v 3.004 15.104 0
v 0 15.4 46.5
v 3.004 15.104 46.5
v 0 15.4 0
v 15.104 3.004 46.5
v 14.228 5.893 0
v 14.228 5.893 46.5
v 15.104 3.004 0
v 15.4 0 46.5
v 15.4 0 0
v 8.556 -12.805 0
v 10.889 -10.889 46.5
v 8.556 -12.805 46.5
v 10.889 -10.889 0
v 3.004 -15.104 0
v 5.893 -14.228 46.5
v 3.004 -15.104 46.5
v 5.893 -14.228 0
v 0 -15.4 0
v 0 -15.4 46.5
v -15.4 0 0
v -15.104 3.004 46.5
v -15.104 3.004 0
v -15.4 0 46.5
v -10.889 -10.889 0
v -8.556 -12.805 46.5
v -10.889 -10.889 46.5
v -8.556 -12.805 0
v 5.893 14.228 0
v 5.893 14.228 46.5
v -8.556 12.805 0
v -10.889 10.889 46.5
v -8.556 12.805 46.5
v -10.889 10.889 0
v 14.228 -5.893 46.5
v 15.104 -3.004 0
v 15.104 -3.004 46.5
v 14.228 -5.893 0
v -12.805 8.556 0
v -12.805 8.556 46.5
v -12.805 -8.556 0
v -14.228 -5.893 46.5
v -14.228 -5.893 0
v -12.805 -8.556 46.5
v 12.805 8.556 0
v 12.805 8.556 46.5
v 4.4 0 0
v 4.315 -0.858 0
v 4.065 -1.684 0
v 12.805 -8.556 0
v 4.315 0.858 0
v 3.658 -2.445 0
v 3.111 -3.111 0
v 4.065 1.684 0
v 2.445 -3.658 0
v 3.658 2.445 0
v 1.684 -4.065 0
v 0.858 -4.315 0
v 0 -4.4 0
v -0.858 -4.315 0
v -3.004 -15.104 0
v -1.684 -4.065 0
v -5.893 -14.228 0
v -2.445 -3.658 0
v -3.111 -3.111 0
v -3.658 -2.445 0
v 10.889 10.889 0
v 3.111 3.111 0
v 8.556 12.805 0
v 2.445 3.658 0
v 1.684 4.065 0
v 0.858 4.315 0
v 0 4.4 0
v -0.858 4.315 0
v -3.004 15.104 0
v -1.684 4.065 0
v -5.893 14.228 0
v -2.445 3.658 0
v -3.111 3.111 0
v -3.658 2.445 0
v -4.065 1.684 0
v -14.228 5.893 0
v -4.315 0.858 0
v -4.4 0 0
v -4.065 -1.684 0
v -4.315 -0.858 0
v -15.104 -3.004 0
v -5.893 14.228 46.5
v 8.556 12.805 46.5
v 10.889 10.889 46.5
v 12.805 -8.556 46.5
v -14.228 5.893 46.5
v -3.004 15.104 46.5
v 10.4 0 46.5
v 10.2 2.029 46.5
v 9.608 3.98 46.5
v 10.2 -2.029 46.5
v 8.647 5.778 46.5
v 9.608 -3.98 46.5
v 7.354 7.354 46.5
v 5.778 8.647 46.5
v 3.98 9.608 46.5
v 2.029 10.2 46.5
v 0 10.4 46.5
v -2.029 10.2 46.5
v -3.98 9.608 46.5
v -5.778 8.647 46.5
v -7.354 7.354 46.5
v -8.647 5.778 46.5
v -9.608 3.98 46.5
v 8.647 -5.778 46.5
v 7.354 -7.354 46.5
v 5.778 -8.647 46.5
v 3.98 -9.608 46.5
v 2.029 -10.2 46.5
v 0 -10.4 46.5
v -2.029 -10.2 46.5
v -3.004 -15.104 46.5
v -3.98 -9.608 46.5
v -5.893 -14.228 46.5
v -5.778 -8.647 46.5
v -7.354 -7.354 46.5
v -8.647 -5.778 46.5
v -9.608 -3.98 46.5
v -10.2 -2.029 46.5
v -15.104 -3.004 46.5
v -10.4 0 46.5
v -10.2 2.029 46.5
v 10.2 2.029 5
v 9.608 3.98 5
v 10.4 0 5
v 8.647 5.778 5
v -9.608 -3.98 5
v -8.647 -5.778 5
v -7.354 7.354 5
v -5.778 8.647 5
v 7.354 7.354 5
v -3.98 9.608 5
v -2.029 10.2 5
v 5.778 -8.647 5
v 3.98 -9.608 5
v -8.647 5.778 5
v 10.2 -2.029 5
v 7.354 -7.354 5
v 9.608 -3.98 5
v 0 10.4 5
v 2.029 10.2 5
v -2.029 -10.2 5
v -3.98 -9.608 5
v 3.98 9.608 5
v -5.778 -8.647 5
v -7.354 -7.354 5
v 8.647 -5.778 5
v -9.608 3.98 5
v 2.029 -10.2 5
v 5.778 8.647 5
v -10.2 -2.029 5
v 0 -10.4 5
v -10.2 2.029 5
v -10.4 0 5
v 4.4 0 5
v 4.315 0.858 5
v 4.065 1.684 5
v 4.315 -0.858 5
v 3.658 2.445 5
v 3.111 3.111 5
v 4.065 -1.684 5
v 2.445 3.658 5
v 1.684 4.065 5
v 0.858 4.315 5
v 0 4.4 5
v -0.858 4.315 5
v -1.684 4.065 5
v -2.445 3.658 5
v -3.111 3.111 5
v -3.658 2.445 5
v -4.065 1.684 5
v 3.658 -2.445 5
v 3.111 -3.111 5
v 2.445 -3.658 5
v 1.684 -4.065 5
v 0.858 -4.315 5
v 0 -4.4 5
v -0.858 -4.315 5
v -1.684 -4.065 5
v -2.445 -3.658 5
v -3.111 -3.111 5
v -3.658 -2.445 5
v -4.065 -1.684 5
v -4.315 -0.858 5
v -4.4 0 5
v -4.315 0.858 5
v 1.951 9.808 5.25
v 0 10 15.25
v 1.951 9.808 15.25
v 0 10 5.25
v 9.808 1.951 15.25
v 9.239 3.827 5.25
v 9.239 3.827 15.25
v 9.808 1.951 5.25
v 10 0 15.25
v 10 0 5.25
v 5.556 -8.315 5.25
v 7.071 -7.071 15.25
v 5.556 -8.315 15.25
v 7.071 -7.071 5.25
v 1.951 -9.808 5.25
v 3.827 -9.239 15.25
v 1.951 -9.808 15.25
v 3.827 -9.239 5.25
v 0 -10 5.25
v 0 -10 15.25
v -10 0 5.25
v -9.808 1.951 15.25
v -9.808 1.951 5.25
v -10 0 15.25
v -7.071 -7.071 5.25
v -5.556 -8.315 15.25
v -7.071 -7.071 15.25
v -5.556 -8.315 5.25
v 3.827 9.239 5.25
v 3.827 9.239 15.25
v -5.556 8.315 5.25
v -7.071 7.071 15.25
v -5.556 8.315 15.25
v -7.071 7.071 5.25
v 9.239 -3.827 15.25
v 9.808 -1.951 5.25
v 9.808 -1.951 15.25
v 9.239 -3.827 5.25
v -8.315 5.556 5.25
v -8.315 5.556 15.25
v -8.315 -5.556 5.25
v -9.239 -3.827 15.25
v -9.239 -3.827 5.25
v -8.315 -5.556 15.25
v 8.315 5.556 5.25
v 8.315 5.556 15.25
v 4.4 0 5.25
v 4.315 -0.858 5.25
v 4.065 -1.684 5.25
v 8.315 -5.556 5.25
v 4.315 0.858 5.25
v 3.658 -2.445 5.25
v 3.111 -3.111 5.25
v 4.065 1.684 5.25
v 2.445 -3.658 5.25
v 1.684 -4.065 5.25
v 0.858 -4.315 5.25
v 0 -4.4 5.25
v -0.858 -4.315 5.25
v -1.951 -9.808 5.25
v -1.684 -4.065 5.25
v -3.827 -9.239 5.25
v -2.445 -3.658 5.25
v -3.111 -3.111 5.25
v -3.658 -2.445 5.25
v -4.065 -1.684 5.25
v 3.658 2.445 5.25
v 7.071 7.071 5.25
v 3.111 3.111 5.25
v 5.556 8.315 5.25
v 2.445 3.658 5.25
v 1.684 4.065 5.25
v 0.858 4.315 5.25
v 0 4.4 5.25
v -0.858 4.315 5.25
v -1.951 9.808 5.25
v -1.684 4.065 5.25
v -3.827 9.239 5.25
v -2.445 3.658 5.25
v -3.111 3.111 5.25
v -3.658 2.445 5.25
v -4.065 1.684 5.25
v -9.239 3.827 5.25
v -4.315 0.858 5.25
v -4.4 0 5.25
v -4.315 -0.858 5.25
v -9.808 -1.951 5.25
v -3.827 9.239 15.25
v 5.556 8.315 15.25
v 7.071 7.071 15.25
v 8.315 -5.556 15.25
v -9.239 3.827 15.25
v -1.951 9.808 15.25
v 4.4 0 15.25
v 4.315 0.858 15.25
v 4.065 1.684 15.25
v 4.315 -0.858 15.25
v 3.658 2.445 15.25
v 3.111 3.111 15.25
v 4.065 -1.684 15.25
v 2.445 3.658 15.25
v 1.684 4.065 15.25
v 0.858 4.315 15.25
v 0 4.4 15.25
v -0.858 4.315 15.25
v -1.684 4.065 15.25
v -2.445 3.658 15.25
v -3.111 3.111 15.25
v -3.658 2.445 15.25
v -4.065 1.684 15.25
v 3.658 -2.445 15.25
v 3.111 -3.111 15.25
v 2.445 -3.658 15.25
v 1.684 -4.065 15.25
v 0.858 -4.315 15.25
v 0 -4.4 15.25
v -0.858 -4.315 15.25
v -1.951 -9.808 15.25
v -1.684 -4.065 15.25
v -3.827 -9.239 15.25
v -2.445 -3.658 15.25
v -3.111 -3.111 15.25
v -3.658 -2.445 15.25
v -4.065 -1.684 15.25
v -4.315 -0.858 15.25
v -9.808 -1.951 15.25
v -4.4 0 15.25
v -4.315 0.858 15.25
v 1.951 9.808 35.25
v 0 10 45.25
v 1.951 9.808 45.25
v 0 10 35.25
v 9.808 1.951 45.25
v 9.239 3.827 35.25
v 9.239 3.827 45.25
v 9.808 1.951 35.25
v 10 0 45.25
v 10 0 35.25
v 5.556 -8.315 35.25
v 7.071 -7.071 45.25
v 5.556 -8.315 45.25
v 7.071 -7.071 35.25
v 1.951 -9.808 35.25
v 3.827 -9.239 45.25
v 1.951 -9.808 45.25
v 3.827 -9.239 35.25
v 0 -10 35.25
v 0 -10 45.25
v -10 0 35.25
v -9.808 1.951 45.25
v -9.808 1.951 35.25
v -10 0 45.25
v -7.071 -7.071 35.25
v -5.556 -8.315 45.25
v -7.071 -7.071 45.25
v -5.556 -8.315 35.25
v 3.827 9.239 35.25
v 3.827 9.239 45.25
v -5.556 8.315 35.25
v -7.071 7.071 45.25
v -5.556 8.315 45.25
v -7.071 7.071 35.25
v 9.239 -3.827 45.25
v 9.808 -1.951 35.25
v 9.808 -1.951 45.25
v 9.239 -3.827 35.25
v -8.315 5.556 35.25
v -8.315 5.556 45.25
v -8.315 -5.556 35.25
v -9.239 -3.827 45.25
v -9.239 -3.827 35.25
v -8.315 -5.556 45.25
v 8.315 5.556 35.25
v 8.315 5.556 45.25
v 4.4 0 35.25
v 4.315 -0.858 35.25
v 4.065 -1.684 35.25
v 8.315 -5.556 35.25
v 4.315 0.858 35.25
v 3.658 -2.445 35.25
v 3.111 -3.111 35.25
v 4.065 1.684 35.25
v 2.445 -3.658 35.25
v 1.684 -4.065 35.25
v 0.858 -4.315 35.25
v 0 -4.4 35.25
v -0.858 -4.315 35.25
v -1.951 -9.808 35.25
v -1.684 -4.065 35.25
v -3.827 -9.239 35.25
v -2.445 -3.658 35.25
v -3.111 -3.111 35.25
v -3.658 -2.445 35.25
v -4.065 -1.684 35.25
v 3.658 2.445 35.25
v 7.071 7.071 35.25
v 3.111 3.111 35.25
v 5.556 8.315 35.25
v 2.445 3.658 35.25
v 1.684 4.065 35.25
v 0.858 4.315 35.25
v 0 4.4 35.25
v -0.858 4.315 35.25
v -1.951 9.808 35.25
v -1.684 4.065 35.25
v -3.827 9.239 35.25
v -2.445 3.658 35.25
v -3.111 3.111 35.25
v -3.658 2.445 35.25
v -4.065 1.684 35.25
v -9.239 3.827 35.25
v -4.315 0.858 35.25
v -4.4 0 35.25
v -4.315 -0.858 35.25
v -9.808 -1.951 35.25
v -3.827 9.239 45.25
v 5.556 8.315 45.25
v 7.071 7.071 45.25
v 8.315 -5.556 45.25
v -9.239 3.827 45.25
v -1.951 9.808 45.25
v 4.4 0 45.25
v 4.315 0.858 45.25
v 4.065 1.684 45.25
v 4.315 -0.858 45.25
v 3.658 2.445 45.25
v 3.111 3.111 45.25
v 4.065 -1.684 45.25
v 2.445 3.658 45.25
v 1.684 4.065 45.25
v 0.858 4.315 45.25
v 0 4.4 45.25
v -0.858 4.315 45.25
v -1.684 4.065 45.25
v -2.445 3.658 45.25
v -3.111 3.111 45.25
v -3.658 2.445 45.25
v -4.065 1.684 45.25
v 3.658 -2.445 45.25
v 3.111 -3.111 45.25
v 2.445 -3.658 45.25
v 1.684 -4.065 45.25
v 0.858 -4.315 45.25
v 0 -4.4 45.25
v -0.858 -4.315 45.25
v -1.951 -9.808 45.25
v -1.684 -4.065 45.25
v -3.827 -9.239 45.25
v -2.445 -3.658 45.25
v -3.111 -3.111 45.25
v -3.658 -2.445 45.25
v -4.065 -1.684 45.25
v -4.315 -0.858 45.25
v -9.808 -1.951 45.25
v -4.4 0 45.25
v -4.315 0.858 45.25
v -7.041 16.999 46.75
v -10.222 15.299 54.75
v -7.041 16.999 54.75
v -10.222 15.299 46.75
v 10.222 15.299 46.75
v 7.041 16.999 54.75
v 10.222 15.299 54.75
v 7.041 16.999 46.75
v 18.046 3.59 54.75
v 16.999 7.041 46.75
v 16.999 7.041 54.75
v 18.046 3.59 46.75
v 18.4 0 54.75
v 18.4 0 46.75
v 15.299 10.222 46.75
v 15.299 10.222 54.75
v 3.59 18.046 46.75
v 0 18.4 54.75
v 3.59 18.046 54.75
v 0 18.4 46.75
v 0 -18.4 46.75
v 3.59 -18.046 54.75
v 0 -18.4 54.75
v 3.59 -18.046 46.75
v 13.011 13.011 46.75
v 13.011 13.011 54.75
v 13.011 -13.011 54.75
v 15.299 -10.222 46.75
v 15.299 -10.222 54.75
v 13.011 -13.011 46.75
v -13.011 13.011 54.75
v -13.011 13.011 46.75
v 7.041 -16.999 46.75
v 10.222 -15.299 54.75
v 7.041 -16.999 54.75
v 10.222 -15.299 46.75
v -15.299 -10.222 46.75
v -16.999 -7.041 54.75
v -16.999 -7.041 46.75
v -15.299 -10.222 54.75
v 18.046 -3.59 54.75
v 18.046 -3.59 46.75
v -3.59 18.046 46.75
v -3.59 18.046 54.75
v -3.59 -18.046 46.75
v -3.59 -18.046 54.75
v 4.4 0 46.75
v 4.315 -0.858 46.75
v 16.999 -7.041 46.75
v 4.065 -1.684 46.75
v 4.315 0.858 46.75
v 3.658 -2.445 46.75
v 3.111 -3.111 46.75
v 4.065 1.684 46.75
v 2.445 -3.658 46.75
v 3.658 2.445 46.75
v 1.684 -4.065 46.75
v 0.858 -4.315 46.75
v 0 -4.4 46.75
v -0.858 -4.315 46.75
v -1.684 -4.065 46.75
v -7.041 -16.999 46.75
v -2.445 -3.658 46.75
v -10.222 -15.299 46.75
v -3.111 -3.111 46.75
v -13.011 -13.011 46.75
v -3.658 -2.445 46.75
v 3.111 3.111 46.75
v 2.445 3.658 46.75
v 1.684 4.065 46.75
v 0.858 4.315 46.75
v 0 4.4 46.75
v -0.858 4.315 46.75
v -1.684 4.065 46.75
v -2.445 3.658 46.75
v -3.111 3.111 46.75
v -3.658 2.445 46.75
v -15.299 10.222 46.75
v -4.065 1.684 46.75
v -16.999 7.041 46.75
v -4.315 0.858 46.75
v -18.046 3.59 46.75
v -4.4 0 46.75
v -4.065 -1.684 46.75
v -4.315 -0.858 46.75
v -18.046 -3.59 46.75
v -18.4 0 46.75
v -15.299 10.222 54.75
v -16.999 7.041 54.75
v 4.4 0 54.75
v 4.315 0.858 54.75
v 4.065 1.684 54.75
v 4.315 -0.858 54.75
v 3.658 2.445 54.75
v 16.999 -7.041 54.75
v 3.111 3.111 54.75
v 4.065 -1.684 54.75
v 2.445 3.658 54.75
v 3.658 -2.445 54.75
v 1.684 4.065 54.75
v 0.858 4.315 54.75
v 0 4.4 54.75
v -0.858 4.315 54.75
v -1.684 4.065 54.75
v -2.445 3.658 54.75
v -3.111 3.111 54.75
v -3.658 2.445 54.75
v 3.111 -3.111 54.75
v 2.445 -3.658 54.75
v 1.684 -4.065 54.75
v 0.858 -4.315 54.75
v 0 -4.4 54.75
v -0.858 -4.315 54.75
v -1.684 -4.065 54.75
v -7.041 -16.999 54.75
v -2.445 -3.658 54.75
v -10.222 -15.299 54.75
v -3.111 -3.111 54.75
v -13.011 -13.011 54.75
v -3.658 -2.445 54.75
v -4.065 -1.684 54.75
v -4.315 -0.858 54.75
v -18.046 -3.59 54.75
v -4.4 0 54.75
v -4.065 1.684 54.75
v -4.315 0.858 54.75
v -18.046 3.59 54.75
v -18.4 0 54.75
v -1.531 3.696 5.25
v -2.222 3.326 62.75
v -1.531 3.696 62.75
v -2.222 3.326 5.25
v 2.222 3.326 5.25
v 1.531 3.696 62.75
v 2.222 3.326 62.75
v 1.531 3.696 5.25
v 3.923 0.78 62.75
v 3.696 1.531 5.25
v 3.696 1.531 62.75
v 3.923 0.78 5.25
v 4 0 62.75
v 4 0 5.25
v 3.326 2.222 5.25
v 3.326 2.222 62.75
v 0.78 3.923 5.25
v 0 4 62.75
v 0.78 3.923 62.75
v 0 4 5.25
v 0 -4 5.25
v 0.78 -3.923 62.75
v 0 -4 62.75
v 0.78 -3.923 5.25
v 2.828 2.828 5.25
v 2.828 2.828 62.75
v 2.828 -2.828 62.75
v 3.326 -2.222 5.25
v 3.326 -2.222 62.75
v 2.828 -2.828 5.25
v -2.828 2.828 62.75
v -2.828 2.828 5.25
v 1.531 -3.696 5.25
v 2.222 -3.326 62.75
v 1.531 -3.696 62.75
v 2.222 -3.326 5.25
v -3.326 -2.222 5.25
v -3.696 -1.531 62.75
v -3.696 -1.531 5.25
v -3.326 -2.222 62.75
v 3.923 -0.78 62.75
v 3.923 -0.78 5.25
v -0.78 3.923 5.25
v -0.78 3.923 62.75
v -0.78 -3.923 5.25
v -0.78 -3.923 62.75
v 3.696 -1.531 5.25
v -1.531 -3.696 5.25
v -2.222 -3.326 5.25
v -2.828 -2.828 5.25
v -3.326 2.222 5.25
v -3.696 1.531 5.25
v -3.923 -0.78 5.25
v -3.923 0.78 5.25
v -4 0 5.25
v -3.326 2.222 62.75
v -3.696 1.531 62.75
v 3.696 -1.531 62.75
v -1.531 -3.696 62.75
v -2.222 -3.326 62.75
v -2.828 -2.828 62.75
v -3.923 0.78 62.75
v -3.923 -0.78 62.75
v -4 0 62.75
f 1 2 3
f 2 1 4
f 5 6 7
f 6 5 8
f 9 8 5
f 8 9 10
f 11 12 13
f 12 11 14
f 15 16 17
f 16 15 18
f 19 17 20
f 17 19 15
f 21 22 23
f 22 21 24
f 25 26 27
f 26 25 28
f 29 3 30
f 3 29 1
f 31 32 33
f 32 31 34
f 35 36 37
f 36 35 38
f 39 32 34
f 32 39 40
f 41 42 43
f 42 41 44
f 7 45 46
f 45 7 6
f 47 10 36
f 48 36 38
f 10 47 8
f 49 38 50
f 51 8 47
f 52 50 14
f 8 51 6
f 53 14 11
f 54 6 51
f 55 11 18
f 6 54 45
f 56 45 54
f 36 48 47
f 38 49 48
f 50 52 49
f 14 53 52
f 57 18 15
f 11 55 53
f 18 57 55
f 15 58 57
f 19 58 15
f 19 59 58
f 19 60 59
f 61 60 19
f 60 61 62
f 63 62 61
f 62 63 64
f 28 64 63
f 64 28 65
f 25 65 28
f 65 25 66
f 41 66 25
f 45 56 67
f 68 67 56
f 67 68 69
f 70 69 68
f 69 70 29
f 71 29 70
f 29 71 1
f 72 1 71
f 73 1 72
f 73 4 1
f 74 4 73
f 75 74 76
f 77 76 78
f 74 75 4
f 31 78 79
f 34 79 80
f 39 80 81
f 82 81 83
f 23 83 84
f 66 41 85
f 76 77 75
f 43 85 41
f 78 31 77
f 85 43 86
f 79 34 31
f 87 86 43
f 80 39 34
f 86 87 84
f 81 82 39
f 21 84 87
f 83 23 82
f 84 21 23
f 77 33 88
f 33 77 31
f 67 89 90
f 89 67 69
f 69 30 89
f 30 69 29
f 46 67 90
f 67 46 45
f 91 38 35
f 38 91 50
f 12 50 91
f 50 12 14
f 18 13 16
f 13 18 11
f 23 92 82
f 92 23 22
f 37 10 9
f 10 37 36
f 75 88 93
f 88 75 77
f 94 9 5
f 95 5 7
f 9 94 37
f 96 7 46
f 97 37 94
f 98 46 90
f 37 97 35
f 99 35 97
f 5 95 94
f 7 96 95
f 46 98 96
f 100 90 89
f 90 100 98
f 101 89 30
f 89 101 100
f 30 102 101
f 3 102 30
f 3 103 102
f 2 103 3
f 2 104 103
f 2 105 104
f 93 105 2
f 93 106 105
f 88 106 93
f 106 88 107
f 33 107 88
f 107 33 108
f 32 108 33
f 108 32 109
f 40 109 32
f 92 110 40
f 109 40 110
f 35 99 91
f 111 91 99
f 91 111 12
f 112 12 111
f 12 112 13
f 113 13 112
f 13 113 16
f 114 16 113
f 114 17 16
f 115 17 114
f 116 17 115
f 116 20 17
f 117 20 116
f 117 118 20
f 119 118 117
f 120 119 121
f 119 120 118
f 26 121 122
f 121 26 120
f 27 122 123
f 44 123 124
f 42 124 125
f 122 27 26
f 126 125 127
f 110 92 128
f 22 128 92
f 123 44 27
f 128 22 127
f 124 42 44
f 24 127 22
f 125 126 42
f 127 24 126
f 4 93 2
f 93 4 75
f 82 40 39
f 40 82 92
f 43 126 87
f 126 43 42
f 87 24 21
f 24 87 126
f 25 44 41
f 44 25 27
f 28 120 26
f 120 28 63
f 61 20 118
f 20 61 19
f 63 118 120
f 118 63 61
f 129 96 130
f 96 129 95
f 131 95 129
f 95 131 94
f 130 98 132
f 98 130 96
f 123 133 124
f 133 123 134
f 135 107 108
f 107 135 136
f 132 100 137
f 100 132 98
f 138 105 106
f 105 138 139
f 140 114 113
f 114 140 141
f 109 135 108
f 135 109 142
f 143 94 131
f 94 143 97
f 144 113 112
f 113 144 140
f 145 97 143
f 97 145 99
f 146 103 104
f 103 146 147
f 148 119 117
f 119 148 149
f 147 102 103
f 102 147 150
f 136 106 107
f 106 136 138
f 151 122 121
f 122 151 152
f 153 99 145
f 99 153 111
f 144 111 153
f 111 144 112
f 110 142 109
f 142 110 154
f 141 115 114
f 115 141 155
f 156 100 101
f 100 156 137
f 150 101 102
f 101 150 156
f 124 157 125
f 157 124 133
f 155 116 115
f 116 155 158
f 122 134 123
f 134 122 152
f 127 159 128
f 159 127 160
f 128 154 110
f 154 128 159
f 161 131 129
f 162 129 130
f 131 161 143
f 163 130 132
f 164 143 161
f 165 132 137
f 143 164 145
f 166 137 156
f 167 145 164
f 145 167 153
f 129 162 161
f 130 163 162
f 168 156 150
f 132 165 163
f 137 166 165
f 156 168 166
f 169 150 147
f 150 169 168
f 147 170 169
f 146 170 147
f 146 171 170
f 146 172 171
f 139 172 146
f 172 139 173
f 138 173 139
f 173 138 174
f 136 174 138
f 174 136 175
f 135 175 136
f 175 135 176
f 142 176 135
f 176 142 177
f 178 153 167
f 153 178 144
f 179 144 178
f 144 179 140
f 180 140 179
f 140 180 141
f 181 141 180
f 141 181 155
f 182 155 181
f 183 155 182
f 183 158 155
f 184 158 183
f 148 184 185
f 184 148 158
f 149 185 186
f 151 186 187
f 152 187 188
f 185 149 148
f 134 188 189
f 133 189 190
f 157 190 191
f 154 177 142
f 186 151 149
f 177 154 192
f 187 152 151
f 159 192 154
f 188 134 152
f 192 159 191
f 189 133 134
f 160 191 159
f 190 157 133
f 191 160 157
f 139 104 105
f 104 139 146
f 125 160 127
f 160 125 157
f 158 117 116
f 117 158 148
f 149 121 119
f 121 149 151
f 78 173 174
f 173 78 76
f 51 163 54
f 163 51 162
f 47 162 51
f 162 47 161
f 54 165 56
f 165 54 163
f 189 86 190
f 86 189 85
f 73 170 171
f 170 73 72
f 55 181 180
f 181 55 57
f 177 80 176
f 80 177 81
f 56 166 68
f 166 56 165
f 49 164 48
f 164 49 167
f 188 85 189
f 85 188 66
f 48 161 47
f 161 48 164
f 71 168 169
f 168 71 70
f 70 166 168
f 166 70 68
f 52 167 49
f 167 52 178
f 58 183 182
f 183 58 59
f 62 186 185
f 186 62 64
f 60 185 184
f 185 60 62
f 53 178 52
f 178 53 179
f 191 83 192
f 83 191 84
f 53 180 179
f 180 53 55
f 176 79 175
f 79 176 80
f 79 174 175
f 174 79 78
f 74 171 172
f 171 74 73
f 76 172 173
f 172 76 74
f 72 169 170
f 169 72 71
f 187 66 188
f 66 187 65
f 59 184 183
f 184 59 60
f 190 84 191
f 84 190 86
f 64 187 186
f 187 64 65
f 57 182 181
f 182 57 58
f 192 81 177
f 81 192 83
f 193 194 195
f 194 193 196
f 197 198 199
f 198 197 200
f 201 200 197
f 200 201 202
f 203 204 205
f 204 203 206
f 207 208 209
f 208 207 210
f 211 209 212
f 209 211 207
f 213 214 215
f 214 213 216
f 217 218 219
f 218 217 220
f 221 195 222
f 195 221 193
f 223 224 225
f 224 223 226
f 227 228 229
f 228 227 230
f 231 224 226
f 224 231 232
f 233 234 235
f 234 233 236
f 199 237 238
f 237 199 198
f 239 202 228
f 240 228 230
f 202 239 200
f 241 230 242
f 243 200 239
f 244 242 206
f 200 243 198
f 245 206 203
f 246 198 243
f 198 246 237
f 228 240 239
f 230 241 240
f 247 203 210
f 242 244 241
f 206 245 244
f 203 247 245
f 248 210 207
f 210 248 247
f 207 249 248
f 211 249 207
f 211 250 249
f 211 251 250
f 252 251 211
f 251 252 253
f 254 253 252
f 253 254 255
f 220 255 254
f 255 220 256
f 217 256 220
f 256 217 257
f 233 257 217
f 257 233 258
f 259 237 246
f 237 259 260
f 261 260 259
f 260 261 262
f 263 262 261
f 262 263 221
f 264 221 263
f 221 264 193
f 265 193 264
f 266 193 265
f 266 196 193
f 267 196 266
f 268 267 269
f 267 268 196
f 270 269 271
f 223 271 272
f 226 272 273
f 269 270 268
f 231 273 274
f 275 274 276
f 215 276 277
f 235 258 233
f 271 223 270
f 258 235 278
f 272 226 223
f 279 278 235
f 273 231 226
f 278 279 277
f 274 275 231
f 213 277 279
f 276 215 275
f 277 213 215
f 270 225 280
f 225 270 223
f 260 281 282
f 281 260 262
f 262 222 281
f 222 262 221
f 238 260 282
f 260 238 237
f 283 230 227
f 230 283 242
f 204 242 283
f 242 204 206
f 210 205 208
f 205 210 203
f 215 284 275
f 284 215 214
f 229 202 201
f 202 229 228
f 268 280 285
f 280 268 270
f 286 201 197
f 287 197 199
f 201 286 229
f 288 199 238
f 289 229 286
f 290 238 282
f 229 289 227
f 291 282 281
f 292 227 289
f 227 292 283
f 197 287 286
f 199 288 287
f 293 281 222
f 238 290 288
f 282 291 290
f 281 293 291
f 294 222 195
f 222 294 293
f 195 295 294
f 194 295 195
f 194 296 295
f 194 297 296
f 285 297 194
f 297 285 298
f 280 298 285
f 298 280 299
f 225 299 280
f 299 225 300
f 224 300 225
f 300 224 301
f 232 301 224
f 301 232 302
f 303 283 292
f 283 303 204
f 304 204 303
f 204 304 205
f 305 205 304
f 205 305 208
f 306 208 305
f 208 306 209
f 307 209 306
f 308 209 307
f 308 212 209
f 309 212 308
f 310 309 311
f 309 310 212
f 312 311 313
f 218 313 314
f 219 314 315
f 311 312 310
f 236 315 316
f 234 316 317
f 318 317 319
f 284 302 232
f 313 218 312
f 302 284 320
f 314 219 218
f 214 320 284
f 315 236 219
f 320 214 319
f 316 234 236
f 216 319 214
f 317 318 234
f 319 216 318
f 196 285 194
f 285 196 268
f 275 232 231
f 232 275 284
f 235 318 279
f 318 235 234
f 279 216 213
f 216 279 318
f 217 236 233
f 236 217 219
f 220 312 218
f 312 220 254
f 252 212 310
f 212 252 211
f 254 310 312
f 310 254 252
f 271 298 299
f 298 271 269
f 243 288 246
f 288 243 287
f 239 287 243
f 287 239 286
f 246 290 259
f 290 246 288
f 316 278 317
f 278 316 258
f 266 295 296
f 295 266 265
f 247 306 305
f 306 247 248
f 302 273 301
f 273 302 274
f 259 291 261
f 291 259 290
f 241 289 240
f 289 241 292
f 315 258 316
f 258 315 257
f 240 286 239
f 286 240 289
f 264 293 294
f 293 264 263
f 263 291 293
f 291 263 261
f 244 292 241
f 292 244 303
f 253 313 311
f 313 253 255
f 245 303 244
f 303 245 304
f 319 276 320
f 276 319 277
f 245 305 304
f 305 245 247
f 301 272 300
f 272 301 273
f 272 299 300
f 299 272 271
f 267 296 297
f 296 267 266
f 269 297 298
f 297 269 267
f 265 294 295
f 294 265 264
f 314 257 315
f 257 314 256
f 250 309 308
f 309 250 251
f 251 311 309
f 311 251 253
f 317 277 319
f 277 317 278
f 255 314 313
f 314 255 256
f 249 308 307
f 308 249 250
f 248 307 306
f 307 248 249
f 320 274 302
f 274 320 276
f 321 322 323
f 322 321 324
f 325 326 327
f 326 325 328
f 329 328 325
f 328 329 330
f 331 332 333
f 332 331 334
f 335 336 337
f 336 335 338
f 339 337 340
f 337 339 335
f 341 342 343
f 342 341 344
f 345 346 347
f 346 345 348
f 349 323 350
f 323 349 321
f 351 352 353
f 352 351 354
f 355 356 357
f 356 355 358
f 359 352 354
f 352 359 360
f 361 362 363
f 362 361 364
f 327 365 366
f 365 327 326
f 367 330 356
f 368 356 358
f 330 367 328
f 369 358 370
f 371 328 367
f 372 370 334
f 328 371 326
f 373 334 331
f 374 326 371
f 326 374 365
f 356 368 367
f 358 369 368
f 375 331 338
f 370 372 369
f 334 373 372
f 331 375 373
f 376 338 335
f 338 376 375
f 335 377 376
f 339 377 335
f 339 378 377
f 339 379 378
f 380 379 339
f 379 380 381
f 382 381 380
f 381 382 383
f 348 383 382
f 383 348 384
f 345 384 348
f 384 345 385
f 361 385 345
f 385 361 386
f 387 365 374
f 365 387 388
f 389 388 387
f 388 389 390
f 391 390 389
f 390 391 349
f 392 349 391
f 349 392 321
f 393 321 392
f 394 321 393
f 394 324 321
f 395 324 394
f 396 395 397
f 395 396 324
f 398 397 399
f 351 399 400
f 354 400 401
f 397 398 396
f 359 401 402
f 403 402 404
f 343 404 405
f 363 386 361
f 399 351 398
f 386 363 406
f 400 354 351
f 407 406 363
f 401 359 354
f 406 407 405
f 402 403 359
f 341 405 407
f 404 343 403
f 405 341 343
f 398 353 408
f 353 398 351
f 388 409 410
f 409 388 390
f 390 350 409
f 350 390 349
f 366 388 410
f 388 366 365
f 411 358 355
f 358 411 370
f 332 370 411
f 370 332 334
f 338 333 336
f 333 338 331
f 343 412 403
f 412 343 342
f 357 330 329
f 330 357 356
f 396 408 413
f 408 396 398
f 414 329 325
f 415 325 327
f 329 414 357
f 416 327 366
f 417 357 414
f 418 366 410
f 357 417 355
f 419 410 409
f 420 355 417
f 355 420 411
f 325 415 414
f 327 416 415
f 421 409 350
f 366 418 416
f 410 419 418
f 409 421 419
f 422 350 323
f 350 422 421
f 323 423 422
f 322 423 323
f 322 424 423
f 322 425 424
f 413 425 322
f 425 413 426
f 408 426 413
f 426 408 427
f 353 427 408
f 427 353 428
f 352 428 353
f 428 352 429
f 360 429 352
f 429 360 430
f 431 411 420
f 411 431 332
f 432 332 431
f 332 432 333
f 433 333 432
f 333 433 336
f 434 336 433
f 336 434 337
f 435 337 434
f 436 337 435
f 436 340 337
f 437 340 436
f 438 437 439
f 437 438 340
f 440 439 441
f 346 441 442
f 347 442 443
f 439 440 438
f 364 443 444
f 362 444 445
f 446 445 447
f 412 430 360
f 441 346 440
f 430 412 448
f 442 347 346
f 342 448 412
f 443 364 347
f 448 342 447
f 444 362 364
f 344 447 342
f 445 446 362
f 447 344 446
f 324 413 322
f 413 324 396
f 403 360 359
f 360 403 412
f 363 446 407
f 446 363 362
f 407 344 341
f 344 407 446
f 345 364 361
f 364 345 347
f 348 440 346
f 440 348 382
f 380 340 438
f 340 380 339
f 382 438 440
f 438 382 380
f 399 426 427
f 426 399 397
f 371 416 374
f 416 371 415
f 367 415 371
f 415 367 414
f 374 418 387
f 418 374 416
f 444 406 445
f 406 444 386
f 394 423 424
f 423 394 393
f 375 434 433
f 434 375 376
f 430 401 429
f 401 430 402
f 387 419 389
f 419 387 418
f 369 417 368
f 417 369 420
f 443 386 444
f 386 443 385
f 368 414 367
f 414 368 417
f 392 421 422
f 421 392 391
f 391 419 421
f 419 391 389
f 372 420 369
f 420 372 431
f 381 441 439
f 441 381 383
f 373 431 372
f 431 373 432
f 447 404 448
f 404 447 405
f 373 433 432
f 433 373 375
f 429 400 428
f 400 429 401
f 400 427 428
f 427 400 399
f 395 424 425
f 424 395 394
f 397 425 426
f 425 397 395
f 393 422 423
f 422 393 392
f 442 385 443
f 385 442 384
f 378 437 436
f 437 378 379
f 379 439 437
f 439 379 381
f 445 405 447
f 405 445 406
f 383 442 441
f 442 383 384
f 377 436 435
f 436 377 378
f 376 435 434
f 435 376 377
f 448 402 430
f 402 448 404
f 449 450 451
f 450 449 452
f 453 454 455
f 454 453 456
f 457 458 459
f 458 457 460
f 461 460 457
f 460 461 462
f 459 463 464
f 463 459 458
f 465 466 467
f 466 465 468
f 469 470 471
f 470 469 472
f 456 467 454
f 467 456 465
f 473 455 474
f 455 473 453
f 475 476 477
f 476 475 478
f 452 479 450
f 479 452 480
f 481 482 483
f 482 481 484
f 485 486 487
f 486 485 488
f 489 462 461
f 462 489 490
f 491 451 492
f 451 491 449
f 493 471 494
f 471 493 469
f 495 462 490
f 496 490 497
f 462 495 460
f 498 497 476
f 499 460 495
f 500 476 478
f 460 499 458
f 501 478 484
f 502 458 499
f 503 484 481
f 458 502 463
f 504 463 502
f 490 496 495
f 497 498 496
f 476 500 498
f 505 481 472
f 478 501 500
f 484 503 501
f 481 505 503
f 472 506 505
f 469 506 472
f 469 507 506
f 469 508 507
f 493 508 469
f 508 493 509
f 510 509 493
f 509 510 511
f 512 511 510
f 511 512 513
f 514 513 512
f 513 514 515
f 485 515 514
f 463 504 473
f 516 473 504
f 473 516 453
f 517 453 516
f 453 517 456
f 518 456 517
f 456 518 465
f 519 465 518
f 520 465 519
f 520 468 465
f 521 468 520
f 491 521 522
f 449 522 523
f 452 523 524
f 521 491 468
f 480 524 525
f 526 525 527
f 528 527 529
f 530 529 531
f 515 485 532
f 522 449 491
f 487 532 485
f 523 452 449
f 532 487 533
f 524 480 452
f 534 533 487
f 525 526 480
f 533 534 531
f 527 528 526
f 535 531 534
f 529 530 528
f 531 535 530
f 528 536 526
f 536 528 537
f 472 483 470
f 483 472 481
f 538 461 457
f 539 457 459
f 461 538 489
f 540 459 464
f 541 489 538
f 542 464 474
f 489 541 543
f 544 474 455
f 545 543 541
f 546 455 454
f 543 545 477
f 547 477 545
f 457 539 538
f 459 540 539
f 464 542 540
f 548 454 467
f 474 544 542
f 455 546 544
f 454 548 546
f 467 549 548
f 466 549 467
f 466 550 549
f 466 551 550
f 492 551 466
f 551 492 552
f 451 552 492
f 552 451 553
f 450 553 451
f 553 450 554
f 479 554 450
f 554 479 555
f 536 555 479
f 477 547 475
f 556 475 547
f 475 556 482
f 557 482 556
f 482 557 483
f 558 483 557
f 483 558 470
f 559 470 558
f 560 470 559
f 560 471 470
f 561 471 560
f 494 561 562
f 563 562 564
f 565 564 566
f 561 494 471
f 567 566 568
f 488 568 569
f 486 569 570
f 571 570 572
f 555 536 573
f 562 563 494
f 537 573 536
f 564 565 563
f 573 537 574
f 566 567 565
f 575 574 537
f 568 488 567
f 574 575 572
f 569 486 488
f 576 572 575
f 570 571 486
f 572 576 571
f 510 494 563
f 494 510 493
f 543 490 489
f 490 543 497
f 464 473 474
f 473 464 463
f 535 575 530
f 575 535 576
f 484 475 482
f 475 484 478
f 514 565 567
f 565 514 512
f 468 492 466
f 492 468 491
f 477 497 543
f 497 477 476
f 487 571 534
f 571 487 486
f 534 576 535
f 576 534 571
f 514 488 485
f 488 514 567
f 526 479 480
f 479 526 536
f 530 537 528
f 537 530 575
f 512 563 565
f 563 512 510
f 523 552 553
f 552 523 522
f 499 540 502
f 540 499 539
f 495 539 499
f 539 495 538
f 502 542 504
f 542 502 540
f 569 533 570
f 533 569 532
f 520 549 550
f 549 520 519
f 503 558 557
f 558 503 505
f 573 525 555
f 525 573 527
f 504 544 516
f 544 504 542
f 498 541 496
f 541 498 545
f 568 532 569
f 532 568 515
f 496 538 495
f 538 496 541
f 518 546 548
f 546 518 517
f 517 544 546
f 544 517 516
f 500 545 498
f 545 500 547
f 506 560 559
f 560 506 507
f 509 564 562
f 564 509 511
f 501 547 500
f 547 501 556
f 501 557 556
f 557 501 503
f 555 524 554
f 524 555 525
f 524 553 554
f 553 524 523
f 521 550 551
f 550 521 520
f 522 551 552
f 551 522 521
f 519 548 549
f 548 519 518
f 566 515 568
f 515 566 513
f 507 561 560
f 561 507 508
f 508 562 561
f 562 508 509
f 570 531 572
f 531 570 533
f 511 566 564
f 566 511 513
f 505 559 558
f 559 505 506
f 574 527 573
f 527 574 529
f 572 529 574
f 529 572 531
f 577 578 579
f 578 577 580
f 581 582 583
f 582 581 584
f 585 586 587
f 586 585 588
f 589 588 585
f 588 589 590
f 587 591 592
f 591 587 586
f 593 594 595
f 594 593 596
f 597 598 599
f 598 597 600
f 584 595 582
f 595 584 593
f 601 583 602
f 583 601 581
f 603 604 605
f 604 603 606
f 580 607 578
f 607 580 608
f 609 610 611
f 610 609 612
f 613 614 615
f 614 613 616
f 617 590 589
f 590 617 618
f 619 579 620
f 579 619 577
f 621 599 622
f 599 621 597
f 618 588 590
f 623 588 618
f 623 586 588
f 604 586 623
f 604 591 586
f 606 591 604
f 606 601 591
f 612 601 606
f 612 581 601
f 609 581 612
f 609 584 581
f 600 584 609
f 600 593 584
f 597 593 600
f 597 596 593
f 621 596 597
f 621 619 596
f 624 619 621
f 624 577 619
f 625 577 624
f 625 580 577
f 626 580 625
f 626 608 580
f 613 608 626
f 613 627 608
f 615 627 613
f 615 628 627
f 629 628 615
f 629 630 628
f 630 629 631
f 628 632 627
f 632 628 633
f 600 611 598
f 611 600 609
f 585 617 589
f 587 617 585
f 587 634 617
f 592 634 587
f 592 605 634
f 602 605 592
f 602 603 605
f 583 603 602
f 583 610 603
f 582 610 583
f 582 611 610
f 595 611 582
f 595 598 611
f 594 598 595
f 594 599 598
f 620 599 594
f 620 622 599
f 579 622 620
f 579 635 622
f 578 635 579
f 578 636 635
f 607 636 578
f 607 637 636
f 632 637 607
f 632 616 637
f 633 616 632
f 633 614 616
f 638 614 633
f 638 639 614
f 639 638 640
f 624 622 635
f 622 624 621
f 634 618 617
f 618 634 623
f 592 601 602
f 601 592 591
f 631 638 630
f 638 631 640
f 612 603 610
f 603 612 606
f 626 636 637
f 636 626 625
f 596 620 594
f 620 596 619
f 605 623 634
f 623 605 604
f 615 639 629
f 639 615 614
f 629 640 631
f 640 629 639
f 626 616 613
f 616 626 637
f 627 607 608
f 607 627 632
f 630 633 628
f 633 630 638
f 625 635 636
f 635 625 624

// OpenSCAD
$fn = 32;

// ------------------------------------------------------------------------
// Shaft station: cup d30.8 x 46.5 mm, shaft d8
// Every part is its own module, assembly() places every instance.
// ------------------------------------------------------------------------

// --- part 1 ---
module housing_cup() {
  difference() {
    cylinder(h = 46.5, d = 30.8);
    translate([0, 0, 5]) cylinder(h = 42.5, d = 20.8);
    translate([0, 0, -1]) cylinder(h = 7, d = 8.8);
  }
}

// --- part 2 ---
module bearing_lower() {
  difference() {
      translate([0, 0, 0]) cylinder(h = 10, d = 20);
      translate([0, 0, -1]) cylinder(h = 12, d = 8.8);
    }
}

// --- part 3 ---
module bearing_upper() {
  difference() {
      translate([0, 0, 0]) cylinder(h = 10, d = 20);
      translate([0, 0, -1]) cylinder(h = 12, d = 8.8);
    }
}

// --- part 4 ---
module station_shaft() {
  translate([0, 0, -28.75]) cylinder(h = 57.5, d = 8);
}

// --- part 5 ---
module station_cover() {
  difference() {
    cylinder(h = 8, d = 36.8);
    translate([0, 0, -1]) cylinder(h = 10, d = 8.8);
  }
}

// --- assembly ---
module assembly() {
  color([0.80, 0.24, 0.20]) translate([0, 0, 0]) rotate([0, 0, 0]) housing_cup();
  color([0.20, 0.45, 0.75]) translate([0, 0, 5.25]) rotate([0, 0, 0]) bearing_lower();
  color([0.25, 0.62, 0.32]) translate([0, 0, 35.25]) rotate([0, 0, 0]) bearing_upper();
  color([0.92, 0.70, 0.18]) translate([0, 0, 34]) rotate([0, 0, 0]) station_shaft();
  color([0.58, 0.35, 0.70]) translate([0, 0, 46.75]) rotate([0, 0, 0]) station_cover();
}

assembly();
